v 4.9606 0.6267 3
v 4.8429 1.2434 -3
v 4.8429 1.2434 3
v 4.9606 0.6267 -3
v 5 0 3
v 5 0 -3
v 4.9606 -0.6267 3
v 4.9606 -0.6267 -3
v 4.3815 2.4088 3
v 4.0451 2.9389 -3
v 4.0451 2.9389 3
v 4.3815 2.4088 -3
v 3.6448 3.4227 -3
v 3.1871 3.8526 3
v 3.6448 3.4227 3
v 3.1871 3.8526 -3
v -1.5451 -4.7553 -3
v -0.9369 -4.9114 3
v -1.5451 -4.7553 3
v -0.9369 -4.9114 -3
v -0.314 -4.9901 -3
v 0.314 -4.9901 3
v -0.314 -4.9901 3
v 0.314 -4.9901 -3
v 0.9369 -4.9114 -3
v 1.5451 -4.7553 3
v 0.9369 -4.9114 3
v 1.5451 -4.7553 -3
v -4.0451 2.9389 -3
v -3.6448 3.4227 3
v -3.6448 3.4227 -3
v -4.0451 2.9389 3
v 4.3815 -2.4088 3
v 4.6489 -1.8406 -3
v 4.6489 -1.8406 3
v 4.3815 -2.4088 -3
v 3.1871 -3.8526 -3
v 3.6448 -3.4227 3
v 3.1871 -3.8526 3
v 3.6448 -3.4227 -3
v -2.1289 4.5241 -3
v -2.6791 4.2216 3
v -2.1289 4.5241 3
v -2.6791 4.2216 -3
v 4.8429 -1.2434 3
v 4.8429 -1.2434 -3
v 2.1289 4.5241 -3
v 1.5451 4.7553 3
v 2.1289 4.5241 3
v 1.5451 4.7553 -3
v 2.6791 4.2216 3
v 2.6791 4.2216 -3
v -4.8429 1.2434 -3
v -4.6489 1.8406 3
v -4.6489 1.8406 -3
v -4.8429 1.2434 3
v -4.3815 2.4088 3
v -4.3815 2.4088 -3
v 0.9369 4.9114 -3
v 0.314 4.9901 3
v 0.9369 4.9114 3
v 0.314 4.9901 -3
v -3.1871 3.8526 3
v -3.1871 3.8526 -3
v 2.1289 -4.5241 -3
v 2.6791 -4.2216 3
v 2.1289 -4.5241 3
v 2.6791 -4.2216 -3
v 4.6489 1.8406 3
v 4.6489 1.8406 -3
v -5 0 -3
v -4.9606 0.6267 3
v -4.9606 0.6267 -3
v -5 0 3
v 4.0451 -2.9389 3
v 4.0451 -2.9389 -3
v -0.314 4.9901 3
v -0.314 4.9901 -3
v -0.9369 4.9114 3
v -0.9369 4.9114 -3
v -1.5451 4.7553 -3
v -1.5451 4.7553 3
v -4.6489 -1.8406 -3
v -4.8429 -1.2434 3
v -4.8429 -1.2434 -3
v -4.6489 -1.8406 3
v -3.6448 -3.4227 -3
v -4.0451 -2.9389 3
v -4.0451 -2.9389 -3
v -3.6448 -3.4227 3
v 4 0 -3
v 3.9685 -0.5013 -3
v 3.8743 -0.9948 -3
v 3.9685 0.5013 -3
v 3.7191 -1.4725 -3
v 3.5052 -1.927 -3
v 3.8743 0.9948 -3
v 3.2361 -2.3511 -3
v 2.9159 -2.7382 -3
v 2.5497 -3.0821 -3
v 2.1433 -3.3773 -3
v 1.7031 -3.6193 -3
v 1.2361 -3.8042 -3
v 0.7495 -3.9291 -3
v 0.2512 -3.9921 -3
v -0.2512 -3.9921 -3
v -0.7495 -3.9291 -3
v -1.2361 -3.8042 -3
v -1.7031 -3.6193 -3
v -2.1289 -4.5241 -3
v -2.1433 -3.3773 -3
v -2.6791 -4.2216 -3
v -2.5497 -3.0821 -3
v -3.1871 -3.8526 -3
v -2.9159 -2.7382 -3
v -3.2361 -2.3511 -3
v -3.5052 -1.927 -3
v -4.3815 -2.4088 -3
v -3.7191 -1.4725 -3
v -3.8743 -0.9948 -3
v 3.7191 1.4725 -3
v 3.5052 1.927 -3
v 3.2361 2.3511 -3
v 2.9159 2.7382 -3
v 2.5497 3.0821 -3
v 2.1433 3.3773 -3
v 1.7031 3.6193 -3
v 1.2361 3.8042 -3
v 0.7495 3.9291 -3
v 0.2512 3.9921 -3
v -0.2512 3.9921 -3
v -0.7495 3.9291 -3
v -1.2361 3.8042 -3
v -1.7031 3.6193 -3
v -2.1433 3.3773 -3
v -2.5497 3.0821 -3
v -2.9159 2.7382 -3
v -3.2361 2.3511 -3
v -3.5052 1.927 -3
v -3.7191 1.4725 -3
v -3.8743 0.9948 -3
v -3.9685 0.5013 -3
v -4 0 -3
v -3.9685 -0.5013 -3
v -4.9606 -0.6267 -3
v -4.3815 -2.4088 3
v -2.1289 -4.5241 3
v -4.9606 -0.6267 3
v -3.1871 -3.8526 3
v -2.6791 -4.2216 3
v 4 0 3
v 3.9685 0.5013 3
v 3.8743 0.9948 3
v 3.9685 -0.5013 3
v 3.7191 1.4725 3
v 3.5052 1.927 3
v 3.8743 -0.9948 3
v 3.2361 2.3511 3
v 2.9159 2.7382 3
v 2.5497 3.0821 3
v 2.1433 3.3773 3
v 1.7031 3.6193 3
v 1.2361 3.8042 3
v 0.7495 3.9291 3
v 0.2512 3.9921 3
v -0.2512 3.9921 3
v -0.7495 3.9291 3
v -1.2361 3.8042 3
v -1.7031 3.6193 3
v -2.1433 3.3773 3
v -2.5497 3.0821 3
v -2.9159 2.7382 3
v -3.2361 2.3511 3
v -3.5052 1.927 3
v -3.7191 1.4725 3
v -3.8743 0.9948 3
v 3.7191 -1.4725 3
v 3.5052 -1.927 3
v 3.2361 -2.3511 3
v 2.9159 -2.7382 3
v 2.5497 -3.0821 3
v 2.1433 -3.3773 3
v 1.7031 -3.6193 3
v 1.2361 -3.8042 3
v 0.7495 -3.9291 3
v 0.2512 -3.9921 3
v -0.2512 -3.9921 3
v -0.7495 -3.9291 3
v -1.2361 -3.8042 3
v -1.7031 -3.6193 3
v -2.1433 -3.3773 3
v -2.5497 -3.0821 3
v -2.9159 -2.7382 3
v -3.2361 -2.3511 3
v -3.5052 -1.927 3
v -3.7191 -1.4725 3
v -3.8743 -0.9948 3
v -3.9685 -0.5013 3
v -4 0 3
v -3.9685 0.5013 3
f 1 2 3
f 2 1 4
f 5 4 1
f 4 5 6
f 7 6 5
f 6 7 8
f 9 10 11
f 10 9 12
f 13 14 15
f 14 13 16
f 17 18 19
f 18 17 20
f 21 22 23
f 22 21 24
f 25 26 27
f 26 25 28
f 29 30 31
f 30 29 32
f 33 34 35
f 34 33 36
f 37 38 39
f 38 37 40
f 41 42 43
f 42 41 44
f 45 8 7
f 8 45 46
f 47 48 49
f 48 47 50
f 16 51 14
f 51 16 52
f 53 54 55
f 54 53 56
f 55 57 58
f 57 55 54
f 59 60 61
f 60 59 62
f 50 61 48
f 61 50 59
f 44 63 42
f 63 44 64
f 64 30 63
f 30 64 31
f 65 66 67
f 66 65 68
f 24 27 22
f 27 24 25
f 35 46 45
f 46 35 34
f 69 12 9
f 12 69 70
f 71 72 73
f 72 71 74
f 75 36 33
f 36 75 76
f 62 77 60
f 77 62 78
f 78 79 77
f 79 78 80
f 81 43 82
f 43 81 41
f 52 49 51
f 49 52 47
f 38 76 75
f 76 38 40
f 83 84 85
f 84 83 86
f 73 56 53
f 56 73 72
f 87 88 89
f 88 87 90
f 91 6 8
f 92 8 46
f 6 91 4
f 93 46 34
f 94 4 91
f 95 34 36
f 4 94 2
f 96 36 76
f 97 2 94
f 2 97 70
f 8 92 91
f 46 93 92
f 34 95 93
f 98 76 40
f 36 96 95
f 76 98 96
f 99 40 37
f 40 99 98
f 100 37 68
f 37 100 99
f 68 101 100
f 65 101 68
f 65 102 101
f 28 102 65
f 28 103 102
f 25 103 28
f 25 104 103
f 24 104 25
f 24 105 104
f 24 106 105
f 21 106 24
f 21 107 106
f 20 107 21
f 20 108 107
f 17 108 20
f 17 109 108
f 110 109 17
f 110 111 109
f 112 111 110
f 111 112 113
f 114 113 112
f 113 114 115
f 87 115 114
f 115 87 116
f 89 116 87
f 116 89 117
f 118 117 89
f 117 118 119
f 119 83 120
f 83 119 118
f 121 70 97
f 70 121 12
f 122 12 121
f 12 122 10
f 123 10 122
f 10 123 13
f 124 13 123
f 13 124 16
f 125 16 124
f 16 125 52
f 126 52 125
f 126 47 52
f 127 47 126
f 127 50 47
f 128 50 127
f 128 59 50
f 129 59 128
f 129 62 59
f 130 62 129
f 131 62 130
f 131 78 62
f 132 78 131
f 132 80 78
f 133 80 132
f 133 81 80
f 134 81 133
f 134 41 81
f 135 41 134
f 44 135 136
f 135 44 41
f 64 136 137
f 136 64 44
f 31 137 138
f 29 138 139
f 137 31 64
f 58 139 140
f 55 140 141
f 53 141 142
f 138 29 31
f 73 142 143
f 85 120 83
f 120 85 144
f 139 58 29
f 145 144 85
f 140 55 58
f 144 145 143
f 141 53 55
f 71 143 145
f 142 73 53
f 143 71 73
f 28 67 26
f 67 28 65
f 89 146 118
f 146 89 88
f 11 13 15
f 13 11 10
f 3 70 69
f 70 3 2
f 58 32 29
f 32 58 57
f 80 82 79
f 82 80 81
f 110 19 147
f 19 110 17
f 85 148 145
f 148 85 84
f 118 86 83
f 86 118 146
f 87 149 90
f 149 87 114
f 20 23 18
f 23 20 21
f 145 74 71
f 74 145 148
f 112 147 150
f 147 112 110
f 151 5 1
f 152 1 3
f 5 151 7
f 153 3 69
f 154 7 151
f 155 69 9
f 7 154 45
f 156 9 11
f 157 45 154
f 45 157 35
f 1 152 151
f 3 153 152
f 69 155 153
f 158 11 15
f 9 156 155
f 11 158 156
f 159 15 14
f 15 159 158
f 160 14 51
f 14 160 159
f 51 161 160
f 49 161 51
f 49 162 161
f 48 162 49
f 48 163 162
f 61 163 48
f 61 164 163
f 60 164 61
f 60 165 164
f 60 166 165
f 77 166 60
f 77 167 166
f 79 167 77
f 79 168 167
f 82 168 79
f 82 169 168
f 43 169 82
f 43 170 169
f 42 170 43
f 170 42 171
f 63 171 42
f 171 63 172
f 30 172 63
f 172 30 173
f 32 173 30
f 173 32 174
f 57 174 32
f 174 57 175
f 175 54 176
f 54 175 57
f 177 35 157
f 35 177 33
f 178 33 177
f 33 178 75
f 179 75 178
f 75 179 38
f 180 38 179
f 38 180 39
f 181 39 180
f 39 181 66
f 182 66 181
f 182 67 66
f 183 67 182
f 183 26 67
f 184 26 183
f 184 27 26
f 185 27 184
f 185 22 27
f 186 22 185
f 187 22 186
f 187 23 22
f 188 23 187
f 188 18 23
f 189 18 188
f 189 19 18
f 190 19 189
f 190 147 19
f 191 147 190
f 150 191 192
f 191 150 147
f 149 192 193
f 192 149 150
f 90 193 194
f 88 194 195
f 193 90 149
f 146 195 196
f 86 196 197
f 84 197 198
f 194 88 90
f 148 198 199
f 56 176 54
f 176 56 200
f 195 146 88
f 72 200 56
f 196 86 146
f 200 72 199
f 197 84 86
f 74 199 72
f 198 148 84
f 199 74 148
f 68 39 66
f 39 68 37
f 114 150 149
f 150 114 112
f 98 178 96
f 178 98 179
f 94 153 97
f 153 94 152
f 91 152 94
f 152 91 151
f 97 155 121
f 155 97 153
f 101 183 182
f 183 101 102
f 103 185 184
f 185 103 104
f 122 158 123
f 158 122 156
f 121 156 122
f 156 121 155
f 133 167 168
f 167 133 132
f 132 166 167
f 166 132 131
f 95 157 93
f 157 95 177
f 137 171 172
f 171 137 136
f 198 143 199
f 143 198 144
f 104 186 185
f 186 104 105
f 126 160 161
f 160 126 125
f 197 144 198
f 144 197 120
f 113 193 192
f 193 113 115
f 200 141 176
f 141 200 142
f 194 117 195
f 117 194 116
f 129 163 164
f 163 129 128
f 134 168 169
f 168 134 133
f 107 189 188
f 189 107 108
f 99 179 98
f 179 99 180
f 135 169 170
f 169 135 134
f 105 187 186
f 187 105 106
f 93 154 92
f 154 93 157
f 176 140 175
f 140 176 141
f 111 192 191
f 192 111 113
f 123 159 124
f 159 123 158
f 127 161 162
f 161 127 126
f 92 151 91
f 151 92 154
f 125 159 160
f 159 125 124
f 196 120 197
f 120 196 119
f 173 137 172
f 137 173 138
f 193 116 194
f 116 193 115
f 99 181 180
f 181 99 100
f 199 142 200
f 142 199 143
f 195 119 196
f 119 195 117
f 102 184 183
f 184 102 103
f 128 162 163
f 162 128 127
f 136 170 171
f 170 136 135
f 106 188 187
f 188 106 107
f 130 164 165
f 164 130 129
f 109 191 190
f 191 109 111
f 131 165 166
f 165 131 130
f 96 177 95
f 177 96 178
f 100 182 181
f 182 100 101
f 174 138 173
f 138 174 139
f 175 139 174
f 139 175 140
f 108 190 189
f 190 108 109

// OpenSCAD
$fn = 50;


difference() {
	union() {
		translate(v = [0, 0, -3.0000000000]) {
			cylinder(h = 6, r = 5.0000000000);
		}
	}
	union() {
		translate(v = [0, 0, -100.0000000000]) {
			cylinder(h = 200, r = 4.0000000000);
		}
	}
}
